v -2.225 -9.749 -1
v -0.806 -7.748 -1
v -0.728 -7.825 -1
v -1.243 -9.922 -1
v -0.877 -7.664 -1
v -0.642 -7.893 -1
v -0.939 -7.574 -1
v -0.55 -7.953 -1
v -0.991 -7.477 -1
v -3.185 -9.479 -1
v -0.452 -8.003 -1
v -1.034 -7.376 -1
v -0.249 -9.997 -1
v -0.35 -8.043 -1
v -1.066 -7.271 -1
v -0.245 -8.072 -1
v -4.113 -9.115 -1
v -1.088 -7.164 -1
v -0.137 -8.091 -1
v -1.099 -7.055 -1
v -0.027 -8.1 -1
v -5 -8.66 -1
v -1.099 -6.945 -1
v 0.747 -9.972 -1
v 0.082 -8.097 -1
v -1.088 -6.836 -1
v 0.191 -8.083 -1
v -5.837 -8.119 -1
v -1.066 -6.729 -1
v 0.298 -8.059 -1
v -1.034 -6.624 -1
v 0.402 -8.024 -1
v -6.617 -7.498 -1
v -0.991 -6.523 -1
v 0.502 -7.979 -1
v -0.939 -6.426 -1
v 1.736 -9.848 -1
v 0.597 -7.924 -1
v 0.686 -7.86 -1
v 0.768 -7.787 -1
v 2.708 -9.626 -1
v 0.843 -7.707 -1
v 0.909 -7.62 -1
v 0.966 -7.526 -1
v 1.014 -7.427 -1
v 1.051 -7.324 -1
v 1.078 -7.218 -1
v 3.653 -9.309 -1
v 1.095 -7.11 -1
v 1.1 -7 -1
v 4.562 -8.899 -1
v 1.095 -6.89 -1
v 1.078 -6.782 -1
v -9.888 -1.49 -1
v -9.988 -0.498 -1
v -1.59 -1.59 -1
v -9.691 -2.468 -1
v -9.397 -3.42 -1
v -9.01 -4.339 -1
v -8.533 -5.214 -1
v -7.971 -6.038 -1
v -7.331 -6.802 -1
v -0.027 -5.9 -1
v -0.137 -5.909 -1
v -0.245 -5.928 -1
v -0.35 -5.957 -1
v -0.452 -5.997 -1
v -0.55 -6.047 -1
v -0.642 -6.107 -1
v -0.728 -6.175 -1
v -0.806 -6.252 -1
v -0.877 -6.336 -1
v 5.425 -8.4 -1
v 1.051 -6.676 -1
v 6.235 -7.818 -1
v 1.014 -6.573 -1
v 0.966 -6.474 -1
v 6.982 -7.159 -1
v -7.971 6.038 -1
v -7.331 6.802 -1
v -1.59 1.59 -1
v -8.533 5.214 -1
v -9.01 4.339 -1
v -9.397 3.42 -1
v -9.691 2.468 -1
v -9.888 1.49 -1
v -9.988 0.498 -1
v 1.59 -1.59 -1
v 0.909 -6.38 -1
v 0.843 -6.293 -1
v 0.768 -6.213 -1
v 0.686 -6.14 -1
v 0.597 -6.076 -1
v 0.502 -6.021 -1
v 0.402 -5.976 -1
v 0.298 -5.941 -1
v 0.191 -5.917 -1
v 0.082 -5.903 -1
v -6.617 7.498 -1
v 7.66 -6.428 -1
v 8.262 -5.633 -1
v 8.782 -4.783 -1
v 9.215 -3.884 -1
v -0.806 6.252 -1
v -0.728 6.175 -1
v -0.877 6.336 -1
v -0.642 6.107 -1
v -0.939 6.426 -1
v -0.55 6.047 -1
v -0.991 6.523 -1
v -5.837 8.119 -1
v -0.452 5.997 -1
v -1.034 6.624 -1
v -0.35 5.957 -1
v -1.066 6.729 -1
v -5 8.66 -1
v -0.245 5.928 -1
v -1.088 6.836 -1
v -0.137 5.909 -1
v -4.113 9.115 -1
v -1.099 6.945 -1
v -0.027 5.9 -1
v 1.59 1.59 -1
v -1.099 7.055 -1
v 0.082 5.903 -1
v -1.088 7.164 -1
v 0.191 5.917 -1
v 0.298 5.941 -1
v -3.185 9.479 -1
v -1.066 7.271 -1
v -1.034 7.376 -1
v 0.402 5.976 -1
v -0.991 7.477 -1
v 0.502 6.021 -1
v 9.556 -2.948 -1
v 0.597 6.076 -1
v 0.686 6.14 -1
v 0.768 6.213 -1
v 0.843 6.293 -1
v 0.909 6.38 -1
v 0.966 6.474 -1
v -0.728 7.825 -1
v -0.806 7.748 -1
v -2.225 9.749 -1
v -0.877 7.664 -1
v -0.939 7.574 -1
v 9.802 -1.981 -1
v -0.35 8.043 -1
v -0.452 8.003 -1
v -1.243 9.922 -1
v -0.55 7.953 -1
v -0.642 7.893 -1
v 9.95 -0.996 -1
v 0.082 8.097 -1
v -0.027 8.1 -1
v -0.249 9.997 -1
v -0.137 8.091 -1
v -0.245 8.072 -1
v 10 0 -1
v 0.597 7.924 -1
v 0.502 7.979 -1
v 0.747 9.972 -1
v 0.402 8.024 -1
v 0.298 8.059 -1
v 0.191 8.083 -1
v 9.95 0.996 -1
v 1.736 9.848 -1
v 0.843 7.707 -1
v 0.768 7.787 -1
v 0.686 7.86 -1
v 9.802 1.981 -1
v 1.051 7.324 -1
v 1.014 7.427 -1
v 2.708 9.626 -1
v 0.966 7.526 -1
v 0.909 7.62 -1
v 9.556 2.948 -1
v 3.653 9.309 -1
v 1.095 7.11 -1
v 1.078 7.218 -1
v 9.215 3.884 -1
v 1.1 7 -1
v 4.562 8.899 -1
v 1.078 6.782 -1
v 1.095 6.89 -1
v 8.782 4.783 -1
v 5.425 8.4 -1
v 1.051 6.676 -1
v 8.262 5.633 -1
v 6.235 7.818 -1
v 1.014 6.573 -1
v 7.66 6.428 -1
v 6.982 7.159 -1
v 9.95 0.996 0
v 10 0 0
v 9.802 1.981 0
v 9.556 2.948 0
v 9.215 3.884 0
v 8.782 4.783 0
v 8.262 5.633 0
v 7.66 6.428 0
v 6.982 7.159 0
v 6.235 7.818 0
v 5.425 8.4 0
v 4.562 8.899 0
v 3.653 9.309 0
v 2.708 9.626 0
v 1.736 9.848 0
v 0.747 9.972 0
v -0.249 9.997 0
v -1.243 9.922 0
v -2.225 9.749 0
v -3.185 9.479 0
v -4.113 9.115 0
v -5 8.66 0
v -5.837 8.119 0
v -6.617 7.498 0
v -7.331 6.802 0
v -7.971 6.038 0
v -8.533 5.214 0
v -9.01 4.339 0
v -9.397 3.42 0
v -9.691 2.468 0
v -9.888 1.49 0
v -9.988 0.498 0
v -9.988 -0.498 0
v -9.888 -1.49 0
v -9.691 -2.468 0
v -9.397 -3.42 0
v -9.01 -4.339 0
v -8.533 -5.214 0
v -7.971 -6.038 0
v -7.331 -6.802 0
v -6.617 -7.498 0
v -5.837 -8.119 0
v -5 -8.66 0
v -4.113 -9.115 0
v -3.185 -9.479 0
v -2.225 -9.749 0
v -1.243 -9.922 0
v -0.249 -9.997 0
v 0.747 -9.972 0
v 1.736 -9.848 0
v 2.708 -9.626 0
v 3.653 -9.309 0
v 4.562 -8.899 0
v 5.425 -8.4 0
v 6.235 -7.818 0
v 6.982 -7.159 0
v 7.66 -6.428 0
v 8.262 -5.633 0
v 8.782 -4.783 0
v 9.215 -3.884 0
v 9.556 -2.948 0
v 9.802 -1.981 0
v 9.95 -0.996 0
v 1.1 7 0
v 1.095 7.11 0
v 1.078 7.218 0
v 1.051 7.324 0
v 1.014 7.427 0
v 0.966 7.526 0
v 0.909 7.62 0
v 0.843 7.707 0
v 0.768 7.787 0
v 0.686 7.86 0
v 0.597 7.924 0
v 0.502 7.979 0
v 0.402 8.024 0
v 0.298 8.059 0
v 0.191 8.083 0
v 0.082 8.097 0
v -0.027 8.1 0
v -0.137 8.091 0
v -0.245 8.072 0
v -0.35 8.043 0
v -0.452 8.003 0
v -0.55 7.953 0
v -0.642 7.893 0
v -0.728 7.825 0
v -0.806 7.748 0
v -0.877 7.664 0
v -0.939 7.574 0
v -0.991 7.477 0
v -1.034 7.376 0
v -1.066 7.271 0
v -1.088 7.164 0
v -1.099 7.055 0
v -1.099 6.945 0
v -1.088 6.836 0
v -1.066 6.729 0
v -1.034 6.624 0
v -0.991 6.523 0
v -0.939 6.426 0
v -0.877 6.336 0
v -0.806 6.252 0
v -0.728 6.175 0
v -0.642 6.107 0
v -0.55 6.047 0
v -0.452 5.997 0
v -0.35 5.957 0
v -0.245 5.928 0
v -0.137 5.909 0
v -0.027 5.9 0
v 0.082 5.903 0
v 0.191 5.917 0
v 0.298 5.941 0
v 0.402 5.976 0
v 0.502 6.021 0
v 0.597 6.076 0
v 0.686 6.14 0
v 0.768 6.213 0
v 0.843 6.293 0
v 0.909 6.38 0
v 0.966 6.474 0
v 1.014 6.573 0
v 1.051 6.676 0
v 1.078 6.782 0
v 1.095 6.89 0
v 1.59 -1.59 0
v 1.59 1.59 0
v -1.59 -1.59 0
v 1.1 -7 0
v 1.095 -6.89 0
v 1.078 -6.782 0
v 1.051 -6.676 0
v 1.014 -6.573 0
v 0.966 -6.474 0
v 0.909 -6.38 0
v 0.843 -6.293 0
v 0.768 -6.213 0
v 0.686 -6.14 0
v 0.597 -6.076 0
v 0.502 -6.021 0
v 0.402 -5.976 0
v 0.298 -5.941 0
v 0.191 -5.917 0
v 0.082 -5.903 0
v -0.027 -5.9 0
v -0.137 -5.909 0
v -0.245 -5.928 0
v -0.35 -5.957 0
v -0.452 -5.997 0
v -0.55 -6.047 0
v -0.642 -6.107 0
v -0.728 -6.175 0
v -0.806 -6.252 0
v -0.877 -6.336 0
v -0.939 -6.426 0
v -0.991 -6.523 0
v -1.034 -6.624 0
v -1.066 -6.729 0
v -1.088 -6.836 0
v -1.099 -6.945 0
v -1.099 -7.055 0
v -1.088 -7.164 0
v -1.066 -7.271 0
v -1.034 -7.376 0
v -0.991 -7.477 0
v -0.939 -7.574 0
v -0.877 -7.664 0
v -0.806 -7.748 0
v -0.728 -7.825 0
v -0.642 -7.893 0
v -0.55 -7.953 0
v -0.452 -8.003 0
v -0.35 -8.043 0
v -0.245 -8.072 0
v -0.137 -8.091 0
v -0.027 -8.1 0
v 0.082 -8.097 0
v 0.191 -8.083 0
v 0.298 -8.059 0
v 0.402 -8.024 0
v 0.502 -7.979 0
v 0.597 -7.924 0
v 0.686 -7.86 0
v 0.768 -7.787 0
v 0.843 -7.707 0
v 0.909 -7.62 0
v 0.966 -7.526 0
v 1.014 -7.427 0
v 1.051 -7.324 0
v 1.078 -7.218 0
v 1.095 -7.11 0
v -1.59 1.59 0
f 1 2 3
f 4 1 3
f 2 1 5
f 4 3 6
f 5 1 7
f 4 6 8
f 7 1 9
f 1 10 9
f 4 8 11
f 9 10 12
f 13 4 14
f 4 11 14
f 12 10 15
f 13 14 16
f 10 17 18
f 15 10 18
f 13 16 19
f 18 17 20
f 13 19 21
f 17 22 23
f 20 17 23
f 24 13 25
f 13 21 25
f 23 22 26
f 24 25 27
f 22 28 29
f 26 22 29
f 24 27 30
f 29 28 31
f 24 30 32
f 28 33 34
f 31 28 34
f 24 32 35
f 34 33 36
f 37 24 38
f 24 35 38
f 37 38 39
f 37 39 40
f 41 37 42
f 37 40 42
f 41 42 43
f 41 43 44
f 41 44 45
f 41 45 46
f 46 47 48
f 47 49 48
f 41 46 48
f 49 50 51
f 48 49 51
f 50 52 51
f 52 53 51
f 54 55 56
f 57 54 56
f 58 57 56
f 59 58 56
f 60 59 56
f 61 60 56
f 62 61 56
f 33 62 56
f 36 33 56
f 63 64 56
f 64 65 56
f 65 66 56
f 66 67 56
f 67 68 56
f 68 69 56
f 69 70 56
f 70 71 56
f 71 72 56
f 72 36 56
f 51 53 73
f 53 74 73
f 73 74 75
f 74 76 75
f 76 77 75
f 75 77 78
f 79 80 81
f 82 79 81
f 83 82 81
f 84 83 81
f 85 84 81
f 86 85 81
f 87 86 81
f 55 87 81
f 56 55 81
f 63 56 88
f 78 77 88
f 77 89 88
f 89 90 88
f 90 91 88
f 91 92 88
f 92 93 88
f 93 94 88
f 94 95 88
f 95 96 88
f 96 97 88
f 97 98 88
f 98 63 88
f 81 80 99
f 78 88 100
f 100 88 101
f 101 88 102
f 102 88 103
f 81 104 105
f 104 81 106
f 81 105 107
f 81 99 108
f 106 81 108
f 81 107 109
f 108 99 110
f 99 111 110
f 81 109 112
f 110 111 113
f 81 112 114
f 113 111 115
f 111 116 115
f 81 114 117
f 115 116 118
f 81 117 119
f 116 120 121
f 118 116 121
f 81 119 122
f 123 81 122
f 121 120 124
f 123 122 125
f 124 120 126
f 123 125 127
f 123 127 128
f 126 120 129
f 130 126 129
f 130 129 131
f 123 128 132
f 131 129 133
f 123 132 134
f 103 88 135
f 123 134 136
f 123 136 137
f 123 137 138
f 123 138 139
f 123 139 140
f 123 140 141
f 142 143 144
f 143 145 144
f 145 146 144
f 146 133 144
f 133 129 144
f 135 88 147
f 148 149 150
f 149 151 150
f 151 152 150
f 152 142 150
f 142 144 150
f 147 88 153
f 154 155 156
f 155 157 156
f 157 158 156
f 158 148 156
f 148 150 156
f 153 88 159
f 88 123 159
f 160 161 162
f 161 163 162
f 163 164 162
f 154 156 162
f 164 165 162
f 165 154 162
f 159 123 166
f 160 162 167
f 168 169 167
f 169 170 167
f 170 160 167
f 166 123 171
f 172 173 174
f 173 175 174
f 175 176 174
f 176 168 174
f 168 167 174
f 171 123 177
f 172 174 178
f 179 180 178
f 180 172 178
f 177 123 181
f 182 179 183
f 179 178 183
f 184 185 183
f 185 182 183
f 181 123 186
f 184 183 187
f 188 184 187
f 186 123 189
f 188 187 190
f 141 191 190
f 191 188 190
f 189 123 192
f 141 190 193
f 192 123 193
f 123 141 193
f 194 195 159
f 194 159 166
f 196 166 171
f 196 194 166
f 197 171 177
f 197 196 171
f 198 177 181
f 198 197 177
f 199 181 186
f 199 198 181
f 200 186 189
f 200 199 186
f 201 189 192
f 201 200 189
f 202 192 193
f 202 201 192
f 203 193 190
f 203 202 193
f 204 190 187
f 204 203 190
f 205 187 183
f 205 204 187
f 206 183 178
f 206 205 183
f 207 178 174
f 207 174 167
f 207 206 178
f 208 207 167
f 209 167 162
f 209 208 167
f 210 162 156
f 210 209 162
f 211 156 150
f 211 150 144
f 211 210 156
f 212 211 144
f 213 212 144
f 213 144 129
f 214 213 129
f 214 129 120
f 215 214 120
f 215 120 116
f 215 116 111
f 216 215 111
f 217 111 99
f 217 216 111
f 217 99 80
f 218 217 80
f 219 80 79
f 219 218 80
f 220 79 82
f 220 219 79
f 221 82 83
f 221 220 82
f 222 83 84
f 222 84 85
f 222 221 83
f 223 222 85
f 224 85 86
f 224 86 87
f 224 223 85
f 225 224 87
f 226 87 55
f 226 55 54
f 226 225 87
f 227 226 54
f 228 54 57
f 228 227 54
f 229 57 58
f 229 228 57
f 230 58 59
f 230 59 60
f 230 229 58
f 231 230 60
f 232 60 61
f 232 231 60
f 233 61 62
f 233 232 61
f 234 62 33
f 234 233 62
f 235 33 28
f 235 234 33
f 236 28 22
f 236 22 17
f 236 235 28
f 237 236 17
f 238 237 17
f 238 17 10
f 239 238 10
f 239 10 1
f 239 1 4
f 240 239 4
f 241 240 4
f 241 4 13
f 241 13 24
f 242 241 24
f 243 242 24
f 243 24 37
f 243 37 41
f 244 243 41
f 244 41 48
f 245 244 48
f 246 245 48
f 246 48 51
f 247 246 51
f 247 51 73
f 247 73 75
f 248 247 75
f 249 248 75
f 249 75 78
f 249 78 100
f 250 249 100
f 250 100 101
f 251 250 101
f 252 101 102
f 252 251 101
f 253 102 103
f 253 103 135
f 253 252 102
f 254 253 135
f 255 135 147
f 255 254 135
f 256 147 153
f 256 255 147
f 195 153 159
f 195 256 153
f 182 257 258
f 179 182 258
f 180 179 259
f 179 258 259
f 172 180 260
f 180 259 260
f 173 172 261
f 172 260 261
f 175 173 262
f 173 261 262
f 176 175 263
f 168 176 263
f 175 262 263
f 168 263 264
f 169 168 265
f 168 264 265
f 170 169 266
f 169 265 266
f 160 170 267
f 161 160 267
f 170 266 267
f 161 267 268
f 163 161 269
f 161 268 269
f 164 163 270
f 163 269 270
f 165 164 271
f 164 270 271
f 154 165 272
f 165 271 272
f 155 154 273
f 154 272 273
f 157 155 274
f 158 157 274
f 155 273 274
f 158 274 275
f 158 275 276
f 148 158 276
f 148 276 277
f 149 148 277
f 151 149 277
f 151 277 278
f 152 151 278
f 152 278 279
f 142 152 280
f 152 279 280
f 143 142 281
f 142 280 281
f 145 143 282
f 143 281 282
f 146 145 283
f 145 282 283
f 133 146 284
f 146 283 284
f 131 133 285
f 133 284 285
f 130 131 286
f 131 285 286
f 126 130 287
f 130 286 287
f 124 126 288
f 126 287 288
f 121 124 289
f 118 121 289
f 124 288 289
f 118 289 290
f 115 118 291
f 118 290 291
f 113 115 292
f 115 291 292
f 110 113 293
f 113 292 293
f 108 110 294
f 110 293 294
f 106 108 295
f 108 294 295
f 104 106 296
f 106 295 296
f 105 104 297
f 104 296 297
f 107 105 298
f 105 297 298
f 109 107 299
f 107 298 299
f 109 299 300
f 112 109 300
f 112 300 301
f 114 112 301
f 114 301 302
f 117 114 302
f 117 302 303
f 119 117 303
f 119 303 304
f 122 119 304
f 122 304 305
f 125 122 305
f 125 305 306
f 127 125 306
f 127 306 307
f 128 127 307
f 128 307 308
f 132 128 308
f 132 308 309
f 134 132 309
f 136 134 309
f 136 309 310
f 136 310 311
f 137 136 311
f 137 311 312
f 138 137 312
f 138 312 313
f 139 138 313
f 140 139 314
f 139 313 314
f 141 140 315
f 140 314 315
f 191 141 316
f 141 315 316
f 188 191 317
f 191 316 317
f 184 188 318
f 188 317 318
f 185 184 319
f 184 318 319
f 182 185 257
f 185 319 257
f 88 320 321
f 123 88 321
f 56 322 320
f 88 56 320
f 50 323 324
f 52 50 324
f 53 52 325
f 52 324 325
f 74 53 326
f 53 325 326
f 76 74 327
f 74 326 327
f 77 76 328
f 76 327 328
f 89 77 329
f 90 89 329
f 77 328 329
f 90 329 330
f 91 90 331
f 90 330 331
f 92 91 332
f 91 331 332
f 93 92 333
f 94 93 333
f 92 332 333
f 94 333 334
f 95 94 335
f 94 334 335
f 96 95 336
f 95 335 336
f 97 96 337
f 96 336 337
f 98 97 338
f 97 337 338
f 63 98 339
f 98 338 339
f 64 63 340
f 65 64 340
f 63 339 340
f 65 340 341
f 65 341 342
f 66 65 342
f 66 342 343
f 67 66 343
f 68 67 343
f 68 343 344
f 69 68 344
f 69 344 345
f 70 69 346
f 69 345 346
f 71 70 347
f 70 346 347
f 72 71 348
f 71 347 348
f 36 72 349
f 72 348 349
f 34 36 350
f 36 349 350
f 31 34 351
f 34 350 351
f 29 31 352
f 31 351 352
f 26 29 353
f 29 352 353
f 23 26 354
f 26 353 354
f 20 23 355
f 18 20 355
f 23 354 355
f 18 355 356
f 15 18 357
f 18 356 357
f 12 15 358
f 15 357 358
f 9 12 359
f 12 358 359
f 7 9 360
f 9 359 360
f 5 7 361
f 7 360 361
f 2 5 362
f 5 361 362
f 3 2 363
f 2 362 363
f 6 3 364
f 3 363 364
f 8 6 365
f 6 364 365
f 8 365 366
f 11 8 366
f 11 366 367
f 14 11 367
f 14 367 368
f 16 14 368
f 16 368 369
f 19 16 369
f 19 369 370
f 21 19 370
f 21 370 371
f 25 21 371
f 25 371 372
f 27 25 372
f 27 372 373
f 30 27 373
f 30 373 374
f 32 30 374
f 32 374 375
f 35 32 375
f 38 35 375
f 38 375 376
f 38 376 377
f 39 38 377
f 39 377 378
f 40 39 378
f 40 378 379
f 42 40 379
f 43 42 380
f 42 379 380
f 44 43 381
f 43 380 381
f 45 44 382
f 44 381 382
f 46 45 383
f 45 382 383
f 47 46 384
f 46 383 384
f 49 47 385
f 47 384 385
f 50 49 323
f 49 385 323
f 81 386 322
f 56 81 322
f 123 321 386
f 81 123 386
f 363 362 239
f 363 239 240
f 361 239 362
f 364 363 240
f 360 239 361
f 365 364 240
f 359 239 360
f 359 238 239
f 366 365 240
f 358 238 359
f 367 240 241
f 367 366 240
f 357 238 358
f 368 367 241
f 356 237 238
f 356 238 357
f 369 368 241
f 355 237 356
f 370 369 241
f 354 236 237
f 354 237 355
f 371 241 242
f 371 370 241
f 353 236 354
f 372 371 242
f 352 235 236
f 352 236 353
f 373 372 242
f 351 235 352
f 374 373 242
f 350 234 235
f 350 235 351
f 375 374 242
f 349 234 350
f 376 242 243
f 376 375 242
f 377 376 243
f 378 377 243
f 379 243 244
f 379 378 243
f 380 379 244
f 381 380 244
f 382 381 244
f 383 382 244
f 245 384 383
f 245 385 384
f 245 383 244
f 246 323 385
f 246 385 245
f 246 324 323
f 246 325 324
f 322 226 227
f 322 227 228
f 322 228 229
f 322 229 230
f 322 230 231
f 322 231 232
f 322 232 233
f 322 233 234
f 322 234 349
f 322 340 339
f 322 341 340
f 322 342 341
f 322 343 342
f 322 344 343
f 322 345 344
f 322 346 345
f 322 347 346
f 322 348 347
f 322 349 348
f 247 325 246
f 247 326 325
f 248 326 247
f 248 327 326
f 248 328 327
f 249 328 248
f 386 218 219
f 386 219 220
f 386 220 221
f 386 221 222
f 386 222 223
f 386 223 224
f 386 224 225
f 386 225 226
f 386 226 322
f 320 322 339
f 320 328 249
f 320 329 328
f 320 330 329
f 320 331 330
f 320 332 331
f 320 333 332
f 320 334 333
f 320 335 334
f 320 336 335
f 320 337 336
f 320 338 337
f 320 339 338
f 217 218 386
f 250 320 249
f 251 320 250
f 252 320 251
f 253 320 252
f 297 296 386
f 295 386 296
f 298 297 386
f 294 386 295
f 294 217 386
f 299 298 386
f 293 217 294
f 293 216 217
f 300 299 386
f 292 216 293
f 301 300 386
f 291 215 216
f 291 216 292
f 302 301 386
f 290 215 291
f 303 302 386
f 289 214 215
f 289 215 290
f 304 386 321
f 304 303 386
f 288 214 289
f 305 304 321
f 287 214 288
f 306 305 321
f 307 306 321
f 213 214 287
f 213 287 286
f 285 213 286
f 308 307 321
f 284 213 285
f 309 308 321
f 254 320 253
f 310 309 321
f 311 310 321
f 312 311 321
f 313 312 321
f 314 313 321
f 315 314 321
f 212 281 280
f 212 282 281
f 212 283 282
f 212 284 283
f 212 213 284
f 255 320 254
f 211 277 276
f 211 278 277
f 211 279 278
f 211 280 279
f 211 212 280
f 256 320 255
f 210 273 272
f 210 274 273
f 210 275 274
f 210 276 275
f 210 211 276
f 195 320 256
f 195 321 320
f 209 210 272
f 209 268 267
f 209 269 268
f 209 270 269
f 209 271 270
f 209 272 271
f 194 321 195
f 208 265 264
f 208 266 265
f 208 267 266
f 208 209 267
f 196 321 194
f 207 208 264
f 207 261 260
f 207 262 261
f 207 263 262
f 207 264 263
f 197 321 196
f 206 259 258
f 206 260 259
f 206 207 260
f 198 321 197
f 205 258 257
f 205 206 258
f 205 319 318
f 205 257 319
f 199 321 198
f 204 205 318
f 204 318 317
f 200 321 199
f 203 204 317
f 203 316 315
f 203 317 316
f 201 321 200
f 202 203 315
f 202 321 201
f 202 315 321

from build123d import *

# Parameters (mm, degrees)
SKETCH1_R          = 10
SKETCH1_R_2        = 1.1
BASE_FLANGE1_DEPTH = 1
CUT_EXTRUDE1_DEPTH = 10


# Sheet-metal steps are written as plain solids
with BuildPart() as part:
    # Sketch1 → Base-Flange1 (new body)
    with BuildSketch(Plane.XY):
        Circle(SKETCH1_R)
        with Locations((0, 7)):
            Circle(SKETCH1_R_2, mode=Mode.SUBTRACT)
        with Locations((0, -7)):
            Circle(SKETCH1_R_2, mode=Mode.SUBTRACT)
    extrude(amount=-BASE_FLANGE1_DEPTH)

    # Sketch6 → Cut-Extrude1 (cut)
    with BuildSketch(Plane.XY):
        Polygon((1.59, 0), (1.59, 1.59), (-1.59, 1.59), (-1.59, -1.59), (1.59, -1.59), align=None)
    extrude(amount=-CUT_EXTRUDE1_DEPTH, mode=Mode.SUBTRACT)


solid = part.part
